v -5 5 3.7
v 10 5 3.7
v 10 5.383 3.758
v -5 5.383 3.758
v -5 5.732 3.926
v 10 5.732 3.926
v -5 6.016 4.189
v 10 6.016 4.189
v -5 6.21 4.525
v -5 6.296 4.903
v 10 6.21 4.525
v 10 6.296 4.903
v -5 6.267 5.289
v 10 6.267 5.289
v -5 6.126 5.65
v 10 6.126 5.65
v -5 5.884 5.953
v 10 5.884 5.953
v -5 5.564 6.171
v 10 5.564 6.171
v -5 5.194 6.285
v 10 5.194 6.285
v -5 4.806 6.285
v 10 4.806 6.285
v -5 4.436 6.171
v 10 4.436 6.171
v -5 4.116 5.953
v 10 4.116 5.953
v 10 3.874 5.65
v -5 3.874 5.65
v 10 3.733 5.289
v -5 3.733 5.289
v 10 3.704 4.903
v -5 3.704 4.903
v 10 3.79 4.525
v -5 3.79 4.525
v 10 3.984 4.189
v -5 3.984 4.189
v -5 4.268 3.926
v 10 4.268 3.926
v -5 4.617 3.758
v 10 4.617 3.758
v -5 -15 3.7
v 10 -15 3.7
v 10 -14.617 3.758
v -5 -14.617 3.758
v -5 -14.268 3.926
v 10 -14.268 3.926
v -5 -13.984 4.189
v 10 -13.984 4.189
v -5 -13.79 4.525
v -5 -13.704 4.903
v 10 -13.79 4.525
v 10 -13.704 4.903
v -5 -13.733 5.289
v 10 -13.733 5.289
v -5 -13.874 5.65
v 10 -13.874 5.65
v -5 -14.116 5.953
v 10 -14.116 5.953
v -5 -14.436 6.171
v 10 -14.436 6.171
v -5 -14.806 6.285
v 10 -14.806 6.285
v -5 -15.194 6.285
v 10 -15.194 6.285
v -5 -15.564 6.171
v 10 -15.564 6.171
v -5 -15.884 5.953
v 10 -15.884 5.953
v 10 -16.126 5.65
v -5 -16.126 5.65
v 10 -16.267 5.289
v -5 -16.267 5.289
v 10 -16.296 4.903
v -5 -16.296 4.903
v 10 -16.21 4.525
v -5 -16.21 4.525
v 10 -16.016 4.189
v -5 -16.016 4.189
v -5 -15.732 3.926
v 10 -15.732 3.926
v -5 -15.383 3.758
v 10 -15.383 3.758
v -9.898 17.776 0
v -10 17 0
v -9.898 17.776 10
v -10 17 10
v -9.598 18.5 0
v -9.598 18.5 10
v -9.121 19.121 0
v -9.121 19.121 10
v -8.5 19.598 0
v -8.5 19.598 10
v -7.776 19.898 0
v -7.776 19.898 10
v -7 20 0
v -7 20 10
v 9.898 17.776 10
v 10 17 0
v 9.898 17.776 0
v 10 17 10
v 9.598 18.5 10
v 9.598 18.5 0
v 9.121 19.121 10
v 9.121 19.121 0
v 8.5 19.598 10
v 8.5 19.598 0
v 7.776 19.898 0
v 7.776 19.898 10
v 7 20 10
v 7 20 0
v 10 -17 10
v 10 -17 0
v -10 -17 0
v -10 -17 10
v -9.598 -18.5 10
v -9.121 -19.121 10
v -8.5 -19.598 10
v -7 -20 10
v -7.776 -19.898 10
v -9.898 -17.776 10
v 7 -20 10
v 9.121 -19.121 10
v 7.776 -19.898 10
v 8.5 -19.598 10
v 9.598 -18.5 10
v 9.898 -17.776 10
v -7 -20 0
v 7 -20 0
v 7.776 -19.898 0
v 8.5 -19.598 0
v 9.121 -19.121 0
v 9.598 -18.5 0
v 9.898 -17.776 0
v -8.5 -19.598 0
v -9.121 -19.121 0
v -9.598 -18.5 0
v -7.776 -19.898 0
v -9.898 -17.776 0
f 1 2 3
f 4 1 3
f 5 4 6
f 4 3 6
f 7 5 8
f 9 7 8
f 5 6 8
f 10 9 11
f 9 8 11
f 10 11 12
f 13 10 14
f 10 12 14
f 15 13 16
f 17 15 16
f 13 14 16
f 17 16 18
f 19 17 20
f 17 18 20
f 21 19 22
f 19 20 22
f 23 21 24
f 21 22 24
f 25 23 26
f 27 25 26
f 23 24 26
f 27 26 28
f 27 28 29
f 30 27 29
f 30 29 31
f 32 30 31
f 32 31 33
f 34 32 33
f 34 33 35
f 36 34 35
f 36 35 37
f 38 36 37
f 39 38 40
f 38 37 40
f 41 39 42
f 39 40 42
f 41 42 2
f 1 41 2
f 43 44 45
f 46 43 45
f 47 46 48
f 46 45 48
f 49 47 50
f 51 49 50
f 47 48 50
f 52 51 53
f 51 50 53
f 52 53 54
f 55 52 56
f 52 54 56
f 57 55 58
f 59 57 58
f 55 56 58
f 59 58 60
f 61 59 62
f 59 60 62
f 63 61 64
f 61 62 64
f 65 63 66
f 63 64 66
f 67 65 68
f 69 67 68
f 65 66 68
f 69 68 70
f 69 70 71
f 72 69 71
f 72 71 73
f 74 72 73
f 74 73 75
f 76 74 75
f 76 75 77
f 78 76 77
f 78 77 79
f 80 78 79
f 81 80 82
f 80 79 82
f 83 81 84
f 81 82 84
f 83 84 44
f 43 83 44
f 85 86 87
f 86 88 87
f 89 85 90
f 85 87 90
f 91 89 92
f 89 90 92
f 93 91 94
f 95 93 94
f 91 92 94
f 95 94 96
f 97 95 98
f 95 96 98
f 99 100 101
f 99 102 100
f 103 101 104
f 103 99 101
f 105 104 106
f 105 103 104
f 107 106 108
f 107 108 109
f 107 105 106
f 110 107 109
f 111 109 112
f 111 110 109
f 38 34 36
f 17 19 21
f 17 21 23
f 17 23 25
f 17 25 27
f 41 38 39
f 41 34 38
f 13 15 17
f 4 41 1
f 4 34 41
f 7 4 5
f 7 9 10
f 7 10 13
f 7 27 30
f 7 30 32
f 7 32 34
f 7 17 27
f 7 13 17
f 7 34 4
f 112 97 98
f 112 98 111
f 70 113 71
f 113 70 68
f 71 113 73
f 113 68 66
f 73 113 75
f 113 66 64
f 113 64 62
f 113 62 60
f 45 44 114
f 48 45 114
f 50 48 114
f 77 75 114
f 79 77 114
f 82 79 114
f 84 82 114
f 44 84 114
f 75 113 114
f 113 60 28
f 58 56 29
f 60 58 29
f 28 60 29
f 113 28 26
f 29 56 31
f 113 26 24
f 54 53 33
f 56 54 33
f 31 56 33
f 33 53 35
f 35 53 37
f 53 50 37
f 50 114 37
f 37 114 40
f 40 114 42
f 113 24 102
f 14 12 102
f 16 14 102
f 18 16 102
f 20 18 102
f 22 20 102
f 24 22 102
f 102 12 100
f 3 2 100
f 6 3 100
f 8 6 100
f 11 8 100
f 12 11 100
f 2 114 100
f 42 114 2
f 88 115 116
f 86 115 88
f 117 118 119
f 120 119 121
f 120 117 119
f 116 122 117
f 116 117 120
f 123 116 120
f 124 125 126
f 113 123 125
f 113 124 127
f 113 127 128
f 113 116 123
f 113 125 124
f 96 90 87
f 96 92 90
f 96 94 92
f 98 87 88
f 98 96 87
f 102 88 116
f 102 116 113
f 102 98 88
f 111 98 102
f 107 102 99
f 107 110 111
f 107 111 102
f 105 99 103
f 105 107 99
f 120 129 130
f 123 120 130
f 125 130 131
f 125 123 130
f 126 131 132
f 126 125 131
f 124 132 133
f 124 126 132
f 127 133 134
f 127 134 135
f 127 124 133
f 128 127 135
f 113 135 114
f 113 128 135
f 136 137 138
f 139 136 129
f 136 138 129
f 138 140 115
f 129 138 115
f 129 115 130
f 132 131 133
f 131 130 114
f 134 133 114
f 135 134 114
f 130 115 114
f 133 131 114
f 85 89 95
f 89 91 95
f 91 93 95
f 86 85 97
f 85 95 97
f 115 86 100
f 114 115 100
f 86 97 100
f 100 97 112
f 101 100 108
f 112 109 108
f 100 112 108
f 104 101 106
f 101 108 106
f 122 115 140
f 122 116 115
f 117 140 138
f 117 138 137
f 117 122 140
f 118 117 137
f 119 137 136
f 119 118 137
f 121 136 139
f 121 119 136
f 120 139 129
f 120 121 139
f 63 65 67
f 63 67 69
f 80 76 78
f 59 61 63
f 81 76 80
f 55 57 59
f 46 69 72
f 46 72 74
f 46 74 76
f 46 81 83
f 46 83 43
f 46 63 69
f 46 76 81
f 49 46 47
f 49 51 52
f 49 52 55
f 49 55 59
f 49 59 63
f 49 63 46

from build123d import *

# Parameters (mm, degrees)
SKETCH_1_W          = 20
SKETCH_1_H          = 40
EXTRUDE_1_DEPTH     = 10
FILLET_1_R          = 3
SKETCH_2_R          = 1.3
CUT_EXTRUDE_1_DEPTH = 15


with BuildPart() as part:
    # ｽｹｯﾁ1 → ﾎﾞｽ - 押し出し1 (new body)
    with BuildSketch(Plane.XY):
        Rectangle(SKETCH_1_W, SKETCH_1_H)
    extrude(amount=EXTRUDE_1_DEPTH)

    # ﾌｨﾚｯﾄ1
    fillet_1_edges = [part.edges().sort_by_distance(p)[0] for p in [
        (-10, 20, 5),
        (10, 20, 5),
        (10, -20, 5),
        (-10, -20, 5),
    ]]
    fillet(fillet_1_edges, radius=FILLET_1_R)

    # ｽｹｯﾁ2 → ｶｯﾄ - 押し出し1 (cut)
    with BuildSketch(Plane(origin=(10, 0, 0), x_dir=(0, 0, -1), z_dir=(1, 0, 0))):
        with Locations((-5, -15)):
            Circle(SKETCH_2_R)
        with Locations((-5, 5)):
            Circle(SKETCH_2_R)
    extrude(amount=-CUT_EXTRUDE_1_DEPTH, mode=Mode.SUBTRACT)


solid = part.part
